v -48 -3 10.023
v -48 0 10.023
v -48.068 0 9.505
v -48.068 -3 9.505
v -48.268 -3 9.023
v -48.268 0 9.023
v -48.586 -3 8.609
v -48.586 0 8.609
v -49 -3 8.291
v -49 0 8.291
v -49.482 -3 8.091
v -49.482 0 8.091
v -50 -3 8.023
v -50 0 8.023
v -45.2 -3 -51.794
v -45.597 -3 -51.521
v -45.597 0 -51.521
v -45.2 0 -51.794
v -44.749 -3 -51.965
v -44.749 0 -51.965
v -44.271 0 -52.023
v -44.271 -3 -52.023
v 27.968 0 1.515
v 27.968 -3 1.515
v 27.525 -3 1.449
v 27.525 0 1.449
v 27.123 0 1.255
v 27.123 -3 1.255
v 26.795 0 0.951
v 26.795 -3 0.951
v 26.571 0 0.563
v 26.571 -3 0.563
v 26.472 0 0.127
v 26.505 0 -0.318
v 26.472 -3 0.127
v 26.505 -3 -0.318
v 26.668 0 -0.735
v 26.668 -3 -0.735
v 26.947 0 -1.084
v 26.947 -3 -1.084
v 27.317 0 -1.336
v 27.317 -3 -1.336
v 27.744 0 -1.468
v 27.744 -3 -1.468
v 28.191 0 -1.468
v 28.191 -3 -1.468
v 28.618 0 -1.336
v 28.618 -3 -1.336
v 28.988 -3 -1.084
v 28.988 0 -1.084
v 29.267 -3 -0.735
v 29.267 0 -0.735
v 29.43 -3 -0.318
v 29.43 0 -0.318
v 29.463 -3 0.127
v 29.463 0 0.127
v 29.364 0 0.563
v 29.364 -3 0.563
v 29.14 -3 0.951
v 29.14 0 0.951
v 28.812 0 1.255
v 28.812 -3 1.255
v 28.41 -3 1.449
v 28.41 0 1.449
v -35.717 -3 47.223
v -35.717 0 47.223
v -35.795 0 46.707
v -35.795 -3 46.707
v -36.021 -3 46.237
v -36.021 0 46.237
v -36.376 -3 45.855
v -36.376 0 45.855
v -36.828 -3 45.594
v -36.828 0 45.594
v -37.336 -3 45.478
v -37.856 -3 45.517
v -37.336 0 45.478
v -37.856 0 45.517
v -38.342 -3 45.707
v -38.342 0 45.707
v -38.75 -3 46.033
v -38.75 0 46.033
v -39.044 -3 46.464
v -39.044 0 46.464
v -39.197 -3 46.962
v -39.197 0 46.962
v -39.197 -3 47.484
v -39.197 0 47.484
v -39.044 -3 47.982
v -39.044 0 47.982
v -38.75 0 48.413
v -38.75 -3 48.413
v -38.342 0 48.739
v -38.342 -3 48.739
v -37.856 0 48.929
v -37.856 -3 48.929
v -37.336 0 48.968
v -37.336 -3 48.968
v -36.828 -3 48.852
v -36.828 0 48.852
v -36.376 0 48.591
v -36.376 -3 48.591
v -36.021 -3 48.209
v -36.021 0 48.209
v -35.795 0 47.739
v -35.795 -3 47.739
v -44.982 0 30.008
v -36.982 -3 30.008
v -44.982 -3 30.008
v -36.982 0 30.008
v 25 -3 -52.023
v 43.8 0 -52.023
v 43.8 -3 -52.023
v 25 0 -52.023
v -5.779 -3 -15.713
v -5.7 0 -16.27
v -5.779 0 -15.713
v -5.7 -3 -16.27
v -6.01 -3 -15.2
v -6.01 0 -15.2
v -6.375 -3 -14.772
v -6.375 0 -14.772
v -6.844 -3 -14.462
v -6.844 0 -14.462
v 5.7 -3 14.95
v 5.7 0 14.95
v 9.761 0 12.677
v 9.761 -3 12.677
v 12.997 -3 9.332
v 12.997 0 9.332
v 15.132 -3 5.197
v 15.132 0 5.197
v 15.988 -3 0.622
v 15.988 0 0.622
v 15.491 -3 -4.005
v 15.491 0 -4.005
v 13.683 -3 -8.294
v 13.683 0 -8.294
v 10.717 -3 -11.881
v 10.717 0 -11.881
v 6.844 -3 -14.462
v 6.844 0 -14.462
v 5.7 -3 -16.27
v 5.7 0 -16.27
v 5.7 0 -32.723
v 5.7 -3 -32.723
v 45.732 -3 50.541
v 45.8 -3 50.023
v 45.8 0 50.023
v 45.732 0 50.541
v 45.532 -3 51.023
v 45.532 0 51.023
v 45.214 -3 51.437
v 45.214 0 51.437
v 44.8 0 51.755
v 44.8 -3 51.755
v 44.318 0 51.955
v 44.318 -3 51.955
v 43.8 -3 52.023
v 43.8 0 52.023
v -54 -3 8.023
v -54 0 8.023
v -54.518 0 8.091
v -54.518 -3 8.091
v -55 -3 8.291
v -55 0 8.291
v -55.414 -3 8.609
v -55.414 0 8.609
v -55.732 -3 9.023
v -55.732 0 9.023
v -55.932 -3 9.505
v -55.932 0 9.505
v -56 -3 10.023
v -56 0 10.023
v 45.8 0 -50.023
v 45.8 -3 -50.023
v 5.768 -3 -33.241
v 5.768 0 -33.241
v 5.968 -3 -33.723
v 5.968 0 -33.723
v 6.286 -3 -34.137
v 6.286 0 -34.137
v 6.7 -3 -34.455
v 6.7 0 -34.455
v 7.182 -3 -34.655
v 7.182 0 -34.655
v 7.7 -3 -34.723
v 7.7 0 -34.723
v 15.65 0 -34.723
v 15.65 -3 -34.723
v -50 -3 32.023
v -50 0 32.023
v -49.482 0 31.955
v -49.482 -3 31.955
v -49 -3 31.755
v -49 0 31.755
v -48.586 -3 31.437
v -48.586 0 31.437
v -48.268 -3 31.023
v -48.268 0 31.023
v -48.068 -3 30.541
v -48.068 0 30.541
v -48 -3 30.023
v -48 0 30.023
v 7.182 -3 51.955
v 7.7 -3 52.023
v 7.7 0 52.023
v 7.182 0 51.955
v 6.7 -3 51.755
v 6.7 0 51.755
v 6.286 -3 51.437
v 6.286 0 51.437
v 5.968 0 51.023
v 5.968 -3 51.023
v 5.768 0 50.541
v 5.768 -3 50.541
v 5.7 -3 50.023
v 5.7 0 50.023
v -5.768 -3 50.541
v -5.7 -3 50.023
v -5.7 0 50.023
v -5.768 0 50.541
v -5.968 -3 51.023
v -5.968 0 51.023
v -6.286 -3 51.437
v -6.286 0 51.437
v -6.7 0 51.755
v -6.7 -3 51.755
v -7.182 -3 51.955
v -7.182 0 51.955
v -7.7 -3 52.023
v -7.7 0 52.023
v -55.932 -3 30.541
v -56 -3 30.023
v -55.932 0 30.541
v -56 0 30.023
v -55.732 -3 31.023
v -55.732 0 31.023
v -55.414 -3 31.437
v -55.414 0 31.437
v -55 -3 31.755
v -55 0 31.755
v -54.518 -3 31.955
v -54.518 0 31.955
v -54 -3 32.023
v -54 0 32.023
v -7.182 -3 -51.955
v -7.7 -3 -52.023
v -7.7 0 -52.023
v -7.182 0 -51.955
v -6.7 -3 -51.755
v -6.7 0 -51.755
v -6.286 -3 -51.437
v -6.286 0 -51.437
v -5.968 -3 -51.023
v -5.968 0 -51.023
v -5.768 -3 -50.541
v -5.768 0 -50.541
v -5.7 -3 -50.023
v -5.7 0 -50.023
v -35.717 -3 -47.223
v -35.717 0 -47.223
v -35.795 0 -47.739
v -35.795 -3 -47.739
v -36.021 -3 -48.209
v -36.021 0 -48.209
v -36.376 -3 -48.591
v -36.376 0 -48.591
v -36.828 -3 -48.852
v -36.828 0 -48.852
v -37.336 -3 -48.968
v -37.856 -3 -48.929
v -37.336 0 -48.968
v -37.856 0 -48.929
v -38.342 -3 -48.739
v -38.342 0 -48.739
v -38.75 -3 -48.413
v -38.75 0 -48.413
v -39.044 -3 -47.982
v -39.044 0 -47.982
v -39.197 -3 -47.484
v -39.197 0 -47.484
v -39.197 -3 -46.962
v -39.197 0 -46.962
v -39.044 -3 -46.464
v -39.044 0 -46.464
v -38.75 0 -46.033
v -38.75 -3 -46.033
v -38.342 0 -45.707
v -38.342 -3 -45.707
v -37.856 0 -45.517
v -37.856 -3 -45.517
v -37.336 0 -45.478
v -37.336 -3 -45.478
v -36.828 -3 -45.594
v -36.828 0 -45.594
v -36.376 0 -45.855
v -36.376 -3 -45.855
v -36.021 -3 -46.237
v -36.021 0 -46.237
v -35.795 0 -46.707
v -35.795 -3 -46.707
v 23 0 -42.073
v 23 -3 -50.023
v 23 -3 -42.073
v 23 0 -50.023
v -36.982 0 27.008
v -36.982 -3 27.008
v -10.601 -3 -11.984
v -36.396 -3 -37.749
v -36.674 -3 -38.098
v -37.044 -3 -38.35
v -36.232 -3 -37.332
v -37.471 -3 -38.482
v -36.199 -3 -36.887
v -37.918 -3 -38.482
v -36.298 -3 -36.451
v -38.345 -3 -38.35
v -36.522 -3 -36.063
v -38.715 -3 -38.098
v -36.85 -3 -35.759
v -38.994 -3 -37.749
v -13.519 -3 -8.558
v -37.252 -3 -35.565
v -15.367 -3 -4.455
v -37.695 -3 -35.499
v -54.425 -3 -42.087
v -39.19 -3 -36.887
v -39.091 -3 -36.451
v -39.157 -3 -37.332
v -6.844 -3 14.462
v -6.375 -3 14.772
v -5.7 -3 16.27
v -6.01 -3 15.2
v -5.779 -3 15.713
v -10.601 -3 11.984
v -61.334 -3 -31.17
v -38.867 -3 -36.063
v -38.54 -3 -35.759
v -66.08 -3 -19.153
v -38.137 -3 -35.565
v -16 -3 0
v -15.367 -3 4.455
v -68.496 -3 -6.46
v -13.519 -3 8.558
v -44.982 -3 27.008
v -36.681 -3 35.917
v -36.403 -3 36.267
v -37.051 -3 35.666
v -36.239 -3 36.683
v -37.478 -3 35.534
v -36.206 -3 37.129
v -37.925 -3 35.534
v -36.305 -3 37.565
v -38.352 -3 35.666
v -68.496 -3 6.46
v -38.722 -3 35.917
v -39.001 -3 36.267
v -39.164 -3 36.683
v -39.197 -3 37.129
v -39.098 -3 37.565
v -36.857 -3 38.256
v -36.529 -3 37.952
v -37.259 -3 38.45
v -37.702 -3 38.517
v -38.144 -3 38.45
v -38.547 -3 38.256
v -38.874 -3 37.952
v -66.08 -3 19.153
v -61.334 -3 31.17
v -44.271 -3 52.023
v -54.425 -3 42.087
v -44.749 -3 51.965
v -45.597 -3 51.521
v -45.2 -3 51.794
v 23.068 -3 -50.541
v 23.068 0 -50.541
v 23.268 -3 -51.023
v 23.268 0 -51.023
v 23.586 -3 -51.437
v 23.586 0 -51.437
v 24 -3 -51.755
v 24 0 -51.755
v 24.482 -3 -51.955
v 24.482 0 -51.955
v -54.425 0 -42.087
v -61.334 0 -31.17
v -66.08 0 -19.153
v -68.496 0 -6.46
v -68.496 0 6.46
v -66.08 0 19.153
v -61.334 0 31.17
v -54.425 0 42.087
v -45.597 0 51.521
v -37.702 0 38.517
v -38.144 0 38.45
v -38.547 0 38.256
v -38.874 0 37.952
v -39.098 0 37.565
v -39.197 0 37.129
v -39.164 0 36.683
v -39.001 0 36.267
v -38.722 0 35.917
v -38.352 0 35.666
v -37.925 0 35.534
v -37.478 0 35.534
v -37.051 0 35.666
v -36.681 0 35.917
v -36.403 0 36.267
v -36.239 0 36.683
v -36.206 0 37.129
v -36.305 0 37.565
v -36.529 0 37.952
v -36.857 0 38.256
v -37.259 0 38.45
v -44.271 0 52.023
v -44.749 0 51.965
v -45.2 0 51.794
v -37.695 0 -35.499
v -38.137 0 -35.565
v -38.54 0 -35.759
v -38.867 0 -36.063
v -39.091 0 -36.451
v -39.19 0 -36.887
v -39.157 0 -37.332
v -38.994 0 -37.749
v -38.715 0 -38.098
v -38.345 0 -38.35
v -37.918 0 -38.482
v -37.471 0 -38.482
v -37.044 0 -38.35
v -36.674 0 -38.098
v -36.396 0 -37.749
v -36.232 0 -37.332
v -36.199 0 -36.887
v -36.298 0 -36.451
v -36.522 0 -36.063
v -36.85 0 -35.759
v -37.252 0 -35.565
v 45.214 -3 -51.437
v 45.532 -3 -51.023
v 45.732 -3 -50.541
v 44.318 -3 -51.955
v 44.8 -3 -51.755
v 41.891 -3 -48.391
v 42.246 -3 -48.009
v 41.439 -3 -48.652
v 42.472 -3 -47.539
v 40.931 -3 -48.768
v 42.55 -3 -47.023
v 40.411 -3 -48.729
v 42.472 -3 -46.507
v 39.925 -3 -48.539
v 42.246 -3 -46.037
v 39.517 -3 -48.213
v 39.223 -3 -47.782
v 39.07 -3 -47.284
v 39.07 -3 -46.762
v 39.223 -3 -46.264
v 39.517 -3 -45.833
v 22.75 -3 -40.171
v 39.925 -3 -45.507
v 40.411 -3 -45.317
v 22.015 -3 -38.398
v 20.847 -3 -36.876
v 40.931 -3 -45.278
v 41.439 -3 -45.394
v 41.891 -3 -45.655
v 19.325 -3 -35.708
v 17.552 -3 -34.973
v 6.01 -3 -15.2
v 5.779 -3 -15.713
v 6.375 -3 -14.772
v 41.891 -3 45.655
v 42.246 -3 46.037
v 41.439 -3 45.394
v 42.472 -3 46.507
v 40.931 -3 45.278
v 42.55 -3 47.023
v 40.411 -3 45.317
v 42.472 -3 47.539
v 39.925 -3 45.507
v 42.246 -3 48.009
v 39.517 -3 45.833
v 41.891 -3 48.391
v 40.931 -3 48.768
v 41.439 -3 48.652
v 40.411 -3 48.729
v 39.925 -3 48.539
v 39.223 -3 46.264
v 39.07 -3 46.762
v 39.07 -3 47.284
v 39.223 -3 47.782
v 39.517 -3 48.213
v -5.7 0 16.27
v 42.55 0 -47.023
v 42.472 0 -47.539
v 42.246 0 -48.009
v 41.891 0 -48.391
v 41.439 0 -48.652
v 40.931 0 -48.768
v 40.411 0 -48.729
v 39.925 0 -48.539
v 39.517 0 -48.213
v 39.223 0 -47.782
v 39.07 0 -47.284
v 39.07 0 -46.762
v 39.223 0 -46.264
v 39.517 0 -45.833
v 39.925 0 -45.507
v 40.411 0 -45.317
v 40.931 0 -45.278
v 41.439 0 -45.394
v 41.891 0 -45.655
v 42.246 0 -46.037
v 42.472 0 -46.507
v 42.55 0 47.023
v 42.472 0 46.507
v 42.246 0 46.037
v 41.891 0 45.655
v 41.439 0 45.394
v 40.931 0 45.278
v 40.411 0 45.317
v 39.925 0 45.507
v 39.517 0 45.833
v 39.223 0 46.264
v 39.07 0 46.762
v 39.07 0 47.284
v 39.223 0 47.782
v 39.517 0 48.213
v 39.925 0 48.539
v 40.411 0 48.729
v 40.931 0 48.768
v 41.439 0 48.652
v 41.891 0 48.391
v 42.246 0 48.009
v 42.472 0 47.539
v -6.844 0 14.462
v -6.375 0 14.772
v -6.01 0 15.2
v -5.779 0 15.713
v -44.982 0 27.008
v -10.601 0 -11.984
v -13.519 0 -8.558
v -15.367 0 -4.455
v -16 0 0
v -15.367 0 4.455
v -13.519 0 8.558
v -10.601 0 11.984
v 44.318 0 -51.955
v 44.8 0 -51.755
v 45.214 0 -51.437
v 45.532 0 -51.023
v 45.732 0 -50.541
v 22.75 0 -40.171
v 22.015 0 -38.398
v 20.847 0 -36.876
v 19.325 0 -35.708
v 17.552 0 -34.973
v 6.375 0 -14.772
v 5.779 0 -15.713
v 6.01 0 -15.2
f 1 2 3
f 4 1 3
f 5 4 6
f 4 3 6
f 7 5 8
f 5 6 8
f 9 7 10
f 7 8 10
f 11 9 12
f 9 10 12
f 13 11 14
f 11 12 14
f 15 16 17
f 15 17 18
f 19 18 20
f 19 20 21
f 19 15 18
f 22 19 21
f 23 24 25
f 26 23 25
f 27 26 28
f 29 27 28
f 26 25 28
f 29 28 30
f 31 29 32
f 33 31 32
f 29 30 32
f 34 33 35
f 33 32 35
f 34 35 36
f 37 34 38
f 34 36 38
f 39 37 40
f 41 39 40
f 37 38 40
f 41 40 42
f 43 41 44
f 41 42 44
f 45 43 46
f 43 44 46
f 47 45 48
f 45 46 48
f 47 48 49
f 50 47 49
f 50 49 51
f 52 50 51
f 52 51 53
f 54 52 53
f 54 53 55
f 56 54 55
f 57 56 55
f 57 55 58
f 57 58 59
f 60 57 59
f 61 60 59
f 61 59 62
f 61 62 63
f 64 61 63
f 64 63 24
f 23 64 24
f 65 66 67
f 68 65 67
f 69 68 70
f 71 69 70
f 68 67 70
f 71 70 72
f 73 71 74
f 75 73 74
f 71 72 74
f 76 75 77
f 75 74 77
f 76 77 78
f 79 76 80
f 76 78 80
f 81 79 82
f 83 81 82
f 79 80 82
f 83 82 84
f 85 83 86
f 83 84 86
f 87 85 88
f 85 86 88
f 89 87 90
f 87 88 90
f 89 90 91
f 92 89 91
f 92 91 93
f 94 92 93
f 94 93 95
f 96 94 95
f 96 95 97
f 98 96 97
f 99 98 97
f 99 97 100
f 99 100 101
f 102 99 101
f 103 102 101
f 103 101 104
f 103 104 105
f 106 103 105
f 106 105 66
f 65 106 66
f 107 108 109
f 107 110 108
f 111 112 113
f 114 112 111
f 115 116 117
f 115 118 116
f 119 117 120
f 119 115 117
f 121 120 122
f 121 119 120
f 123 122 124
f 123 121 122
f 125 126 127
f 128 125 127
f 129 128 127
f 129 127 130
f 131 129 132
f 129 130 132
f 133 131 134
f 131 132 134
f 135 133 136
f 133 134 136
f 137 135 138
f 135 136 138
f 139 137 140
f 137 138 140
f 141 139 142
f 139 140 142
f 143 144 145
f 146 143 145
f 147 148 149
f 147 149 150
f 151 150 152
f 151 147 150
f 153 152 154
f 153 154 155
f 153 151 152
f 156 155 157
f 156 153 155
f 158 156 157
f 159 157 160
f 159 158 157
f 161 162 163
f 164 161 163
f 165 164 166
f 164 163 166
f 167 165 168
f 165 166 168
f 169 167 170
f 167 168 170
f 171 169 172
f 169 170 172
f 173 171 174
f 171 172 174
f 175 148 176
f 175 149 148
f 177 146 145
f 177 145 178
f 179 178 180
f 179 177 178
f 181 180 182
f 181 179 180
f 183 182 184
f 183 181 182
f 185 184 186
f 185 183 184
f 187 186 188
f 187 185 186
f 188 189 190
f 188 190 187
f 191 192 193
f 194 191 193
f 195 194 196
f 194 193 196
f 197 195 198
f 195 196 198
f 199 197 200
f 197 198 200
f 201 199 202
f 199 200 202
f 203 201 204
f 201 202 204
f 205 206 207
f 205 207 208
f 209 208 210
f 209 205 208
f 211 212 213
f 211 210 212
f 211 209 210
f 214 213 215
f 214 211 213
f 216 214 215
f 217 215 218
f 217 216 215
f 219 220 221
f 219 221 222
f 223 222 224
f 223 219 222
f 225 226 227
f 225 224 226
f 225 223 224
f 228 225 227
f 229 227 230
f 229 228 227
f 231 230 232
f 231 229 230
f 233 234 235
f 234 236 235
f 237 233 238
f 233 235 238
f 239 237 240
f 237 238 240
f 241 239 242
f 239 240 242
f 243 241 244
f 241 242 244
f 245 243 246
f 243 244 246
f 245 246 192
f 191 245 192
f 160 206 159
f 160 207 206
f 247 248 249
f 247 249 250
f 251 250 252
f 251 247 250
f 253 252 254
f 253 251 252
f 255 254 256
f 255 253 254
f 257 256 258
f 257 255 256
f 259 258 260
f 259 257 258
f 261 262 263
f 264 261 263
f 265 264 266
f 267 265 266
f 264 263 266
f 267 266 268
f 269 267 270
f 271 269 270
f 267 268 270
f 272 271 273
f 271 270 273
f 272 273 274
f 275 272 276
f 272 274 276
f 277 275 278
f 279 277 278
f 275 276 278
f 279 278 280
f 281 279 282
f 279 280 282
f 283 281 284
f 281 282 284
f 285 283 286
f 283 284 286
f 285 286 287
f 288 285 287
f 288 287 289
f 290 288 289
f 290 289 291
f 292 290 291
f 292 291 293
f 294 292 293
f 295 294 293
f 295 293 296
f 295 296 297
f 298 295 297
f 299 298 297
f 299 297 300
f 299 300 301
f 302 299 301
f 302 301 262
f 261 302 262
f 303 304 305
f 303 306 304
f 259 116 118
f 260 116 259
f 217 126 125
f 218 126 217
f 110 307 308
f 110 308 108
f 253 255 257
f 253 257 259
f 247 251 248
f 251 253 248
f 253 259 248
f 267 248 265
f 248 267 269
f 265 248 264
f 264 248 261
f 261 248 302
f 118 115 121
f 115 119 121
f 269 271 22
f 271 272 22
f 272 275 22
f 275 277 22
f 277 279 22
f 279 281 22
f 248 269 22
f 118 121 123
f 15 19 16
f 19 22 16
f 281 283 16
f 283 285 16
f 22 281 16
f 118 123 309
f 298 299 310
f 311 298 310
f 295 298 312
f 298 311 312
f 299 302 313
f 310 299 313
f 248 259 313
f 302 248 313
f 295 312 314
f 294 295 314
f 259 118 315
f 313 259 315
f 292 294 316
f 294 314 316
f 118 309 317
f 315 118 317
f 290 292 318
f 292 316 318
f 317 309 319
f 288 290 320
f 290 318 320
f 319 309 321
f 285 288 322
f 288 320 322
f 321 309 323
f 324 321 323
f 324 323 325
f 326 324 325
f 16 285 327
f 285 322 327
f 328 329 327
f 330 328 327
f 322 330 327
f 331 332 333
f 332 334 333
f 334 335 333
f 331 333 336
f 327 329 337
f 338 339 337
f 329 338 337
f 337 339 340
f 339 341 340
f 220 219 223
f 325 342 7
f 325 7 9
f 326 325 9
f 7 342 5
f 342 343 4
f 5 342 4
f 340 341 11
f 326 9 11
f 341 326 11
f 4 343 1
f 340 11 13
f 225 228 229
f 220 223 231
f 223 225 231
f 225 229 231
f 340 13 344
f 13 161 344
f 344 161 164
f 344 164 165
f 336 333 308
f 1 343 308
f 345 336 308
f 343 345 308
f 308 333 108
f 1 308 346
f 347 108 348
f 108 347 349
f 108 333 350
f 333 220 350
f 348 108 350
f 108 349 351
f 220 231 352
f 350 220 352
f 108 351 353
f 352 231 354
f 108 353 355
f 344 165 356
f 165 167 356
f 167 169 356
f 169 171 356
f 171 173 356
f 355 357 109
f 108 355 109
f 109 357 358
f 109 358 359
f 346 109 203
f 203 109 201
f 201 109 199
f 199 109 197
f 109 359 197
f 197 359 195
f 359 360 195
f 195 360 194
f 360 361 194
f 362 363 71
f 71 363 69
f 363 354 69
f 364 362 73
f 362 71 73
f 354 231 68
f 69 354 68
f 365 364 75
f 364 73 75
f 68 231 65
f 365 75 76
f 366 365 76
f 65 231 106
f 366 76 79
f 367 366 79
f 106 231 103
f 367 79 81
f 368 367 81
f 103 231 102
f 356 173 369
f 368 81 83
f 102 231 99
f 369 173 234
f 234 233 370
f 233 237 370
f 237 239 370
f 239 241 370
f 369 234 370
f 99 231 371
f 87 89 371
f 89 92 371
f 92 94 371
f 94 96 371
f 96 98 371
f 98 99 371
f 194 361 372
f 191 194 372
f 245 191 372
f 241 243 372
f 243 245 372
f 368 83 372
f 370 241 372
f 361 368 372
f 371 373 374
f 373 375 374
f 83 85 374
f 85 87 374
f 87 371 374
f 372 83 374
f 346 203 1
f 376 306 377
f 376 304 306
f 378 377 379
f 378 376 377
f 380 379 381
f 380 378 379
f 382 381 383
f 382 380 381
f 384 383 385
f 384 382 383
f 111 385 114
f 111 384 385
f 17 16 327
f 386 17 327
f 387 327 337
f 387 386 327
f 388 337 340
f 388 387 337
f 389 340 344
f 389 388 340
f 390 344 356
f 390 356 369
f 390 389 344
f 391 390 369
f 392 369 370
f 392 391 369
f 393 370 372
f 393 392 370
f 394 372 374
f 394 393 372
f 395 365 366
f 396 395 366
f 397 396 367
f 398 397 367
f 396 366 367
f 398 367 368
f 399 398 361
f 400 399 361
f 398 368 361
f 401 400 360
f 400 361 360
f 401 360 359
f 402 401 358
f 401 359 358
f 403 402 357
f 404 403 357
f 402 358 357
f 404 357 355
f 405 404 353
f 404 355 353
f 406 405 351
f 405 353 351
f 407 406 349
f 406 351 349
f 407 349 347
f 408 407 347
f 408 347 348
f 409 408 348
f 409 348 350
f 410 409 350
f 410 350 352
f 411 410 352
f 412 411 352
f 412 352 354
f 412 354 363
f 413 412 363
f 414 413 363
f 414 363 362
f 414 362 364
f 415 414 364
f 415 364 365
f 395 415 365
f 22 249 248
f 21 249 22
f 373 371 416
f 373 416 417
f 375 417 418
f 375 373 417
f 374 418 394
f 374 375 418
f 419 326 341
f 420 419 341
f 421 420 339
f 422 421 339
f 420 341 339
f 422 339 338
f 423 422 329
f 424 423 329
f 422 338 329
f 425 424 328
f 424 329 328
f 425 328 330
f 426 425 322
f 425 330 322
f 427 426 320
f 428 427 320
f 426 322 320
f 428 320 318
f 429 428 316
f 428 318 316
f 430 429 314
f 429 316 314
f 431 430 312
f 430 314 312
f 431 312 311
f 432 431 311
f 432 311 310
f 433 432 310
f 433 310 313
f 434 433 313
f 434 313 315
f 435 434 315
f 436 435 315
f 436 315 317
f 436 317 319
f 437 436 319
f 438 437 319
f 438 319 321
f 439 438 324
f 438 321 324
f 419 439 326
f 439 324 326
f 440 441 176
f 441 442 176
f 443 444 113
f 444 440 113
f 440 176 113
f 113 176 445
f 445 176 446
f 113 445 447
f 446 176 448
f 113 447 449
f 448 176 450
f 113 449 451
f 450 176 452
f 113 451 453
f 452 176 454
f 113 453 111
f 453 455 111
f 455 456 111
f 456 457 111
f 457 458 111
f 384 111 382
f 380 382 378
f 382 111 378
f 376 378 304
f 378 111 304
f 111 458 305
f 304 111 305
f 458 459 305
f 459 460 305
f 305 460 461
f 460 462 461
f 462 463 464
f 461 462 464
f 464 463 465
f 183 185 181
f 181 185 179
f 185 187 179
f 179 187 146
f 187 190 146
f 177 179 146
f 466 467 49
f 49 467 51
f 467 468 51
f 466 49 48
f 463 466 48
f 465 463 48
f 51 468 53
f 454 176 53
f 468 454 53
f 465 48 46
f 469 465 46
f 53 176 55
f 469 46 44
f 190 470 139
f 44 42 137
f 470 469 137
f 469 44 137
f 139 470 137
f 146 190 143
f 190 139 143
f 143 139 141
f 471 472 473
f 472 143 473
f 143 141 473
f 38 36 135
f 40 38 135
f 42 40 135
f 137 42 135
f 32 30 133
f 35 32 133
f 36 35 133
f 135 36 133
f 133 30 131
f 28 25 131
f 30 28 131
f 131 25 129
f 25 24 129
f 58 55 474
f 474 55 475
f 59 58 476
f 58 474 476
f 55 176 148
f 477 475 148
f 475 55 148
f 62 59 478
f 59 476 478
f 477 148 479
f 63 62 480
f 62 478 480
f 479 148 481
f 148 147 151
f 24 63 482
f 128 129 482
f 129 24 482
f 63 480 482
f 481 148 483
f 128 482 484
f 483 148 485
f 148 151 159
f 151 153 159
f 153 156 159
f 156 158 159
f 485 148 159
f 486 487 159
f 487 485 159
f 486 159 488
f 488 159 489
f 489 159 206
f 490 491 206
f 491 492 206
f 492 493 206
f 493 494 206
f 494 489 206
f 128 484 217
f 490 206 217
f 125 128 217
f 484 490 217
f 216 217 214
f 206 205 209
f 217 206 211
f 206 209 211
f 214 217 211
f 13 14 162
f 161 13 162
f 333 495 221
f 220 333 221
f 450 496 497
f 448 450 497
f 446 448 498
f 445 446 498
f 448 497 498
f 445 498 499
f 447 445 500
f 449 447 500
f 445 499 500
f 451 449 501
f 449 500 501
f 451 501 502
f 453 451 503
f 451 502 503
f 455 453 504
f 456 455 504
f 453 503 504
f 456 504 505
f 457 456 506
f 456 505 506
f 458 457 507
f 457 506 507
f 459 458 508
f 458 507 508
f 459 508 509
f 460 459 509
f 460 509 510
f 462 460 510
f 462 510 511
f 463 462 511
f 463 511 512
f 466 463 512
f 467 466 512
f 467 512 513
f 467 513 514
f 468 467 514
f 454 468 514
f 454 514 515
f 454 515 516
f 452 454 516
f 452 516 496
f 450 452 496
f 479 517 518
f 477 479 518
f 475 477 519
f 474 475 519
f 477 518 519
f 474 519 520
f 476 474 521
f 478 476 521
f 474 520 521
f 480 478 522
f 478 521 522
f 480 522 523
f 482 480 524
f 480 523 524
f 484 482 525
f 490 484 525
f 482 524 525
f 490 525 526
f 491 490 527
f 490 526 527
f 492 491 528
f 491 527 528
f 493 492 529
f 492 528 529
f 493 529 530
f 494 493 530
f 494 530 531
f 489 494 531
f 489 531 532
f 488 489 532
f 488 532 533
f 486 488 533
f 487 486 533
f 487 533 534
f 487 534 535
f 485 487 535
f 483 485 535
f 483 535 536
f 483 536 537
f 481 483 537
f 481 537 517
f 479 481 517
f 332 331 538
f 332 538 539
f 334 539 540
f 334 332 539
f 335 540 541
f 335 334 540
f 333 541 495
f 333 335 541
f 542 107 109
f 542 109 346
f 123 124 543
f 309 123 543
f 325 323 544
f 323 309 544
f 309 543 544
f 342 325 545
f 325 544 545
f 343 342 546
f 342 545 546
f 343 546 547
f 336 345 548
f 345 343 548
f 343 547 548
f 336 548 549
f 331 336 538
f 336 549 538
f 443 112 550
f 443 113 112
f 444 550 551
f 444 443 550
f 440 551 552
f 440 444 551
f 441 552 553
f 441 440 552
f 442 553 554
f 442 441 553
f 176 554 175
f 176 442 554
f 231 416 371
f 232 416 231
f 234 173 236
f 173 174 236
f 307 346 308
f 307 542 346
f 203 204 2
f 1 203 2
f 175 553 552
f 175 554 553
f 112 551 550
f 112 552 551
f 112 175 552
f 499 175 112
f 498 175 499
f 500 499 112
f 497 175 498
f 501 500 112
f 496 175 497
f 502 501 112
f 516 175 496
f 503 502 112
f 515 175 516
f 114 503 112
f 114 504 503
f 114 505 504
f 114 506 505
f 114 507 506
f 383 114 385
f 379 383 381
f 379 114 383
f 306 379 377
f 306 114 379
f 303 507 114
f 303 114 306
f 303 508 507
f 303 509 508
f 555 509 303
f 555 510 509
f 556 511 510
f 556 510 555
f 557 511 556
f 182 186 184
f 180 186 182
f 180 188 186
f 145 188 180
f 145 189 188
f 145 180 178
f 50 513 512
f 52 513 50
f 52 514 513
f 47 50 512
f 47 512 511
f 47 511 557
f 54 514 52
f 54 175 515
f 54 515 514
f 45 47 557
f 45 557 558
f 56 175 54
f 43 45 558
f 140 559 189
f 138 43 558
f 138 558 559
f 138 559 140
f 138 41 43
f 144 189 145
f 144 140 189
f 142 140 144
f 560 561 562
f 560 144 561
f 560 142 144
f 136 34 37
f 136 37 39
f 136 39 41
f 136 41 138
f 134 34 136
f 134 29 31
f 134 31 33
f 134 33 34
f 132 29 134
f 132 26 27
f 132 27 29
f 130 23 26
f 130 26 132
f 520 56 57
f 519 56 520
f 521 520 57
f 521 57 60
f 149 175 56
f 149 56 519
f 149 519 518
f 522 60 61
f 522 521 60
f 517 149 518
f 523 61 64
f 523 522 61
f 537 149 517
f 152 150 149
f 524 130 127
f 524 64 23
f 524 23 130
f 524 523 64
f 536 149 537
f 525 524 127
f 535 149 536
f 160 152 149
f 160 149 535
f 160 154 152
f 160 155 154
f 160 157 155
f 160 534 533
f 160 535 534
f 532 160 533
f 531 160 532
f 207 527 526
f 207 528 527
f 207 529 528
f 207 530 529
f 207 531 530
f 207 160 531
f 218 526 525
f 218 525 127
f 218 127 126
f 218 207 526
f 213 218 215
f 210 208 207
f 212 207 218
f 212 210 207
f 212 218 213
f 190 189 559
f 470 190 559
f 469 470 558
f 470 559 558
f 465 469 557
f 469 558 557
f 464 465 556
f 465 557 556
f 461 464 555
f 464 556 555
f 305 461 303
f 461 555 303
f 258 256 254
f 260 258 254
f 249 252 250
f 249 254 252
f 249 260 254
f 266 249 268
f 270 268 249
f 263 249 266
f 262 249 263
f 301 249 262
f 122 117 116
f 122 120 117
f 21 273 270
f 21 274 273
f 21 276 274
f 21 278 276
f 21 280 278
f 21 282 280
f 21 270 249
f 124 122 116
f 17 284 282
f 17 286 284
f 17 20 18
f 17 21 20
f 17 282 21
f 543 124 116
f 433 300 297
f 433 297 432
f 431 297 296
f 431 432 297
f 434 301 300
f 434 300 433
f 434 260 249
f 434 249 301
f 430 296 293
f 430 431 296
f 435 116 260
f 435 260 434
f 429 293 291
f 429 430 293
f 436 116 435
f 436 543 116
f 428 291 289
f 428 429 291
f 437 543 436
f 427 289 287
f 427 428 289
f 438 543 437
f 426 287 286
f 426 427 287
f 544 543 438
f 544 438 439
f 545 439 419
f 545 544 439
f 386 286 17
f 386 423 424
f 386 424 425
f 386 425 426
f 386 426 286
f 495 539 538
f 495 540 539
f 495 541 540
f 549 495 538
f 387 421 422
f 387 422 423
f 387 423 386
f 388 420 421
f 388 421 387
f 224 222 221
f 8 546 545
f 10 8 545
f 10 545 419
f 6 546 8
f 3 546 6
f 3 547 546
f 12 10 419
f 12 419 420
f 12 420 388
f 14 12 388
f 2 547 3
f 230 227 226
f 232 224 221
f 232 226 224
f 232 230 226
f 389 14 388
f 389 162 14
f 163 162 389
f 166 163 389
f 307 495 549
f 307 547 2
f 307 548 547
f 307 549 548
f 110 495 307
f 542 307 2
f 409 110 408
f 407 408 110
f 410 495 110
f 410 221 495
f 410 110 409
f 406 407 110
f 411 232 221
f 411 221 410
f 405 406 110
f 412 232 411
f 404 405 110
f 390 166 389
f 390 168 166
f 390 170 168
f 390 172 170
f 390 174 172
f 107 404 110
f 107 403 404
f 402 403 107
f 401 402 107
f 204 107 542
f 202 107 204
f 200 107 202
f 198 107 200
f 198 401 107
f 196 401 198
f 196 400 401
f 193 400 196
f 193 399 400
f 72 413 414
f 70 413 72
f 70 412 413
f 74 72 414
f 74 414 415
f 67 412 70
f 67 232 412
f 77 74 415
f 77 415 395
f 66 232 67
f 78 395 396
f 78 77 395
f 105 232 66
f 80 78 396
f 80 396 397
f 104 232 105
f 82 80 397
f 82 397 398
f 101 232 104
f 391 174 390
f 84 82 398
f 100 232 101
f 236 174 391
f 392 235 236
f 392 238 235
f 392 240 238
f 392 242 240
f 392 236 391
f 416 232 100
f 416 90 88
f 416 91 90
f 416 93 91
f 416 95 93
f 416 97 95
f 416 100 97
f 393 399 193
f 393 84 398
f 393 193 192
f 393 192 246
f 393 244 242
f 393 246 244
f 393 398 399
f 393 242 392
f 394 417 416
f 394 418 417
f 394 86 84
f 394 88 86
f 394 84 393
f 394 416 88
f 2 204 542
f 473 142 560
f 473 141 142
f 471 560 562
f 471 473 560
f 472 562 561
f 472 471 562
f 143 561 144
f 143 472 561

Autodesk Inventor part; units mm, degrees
ref_plane "YZ Plane" through (0, 0, 0) normal (1, 0, 0) x (0, 1, 0)
ref_plane "XZ Plane" through (0, 0, 0) normal (0, 1, 0) x (-1, 0, 0)
ref_plane "XY Plane" through (0, 0, 0) normal (0, 0, 1) x (1, 0, 0)
sketch "Sketch1" plane through (0, 0, 0) normal (0, 1, 0) x (-1, 0, 0)
  line L0 (46.9204, 62.223) -> (-47, 62.223)
  line L1 (-47, -62.223) -> (46.9204, -62.223)
  line L2 (-56, 53.223) -> (-56, -53.223)
  arc A0 (50.0907, -61.0894) -> (50.0907, 61.0894) centre (0, 0) ccw
  arc A1 (50.0907, 61.0894) -> (46.9204, 62.223) centre (46.9204, 57.223) ccw
  arc A2 (46.9204, -62.223) -> (50.0907, -61.0894) centre (46.9204, -57.223) ccw
  arc A3 (-47, 62.223) -> (-56, 53.223) centre (-47, 53.223) ccw
  arc A4 (-56, -53.223) -> (-47, -62.223) centre (-47, -53.223) ccw
  line L3 (-46, 52.223) -> (45.0972, 52.223)
  arc A5 (45.0972, -52.223) -> (45.0972, 52.223) centre (0, 0) ccw
  line L4 (45.0972, -52.223) -> (-46, -52.223)
  line L5 (-46, -52.223) -> (-46, 52.223)
  circle A6 centre (0, 0) radius 8.5
  circle A7 centre (0, 0) radius 15.5
  line L6 (-5.5, -14.4914) -> (-5.5, -52.223)
  line L7 (0, 0) -> (0, -8.5)
  line L8 (5.5, -14.4914) -> (5.5, -52.223)
  line L9 (0, 0) -> (8.5, 0)
  line L10 (-5.5, 14.4914) -> (-5.5, 52.223)
  line L11 (5.5, 14.4914) -> (5.5, 52.223)
  circle A8 centre (-14.15, -43.573) radius 5.65
  line L12 (-14.15, -43.573) -> (-14.15, -52.223)
  line L13 (-5.5, -43.573) -> (-14.15, -43.573)
  line L14 (-5.5, -34.923) -> (-15.65, -34.923)
  line L15 (-22.8, -42.073) -> (-22.8, -52.223)
  arc A9 (-15.65, -34.923) -> (-22.8, -42.073) centre (-15.65, -42.073) ccw
  line L16 (45.0227, 52.023) -> (-45.8, 52.023)
  line L17 (-45.8, 52.023) -> (-45.8, -52.023)
  line L18 (-45.8, -52.023) -> (45.0227, -52.023)
  arc A10 (45.0227, -52.023) -> (45.0227, 52.023) centre (0, 0) ccw
  line L19 (5.7, -14.4914) -> (5.7, -52.223)
  circle A11 centre (0, 0) radius 16
  line L20 (5.7, 14.9503) -> (5.7, 52.223)
  line L21 (-5.7, 14.9503) -> (-5.7, 52.223)
  line L22 (-5.7, -14.4914) -> (-5.7, -52.223)
  line L23 (-23, -52.223) -> (-23, -42.073)
  arc A12 (-15.65, -34.723) -> (-23, -42.073) centre (-15.65, -42.073) ccw
  line L24 (-15.65, -34.723) -> (-5.5, -34.723)
  point P0 (48.6754, 62.223)
  point P1 (48.6754, -62.223)
  point P2 (5.5, -52.223)
  point P3 (5.5, -14.4914)
  point P4 (5.5, 14.4914)
  point P5 (5.5, 52.223)
  point P6 (-5.5, 52.223)
  point P7 (-5.5, 14.4914)
  point P8 (-22.8, -52.223)
  point P9 (-46, -32.923)
  point P10 (-23, -52.023)
  point P11 (-5.7, -34.723)
  point P12 (-5.7, -14.9503)
  point P13 (-5.7, 52.023)
  point P14 (5.7, 52.023)
  point P15 (5.7, -14.9503)
  point P16 (5.7, -52.023)
  dimension "d2" = 62.223
  dimension "d4" = 56
  dimension "d5" = 62.223
  dimension "d6" = 79
  dimension "d7" = 5
  dimension "d8" = 9
  dimension "d18" = 10
  dimension "d21" = 17
  dimension "d22" = 7
  dimension "d24" = 5.5
  dimension "d41" = 11.3
  dimension "d45" = 8.65
  dimension "d46" = 8.65
  dimension "d47" = 17.3
  dimension "d48" = 3
  dimension "d49" = 90
  dimension "d50" = 7.15
  dimension "d102" = 0.2
  dimension "d103" = 0.2
  dimension "d104" = 0.5
  dimension "d105" = 0.2
  dimension "d106" = 0.2
  dimension "d107" = 0.2
  dimension "d108" = 0.2
extrude "Extrusion1" add sketch "Sketch1" against normal blind 3 contours L21 A11 L22 L24 A12 L23 L18 L17 L16 | L16 A10 L18 L19 A11 L20
fillet "Fillet11" radius 2 12 edges at (-5.7, -1.5, -14.9503) (-5.7, -1.5, 14.9503) (-5.7, -1.5, -52.023) (-45.0227, -1.5, -52.023) (5.7, -1.5, -14.9503) (5.7, -1.5, -34.723) (23, -1.5, -52.023) (45.8, -1.5, -52.023) (45.8, -1.5, 52.023) (5.7, -1.5, 52.023) (-5.7, -1.5, 52.023) (-45.0227, -1.5, 52.023)
sketch "Sketch6" plane through (0, 0, 0) normal (0, 1, 0) x (1, 0, 0)
  circle A0 centre (-37.467, 47.223) radius 1.75
  circle A1 centre (40.8, 47.023) radius 1.75
  line L0 (-7.7, 52.023) -> (-44.2712, 52.023) projected
  line L1 (-5.7, 16.2699) -> (-5.7, 50.023) projected
  line L2 (0, 0) -> (-24.1524, 0)
  circle A2 centre (-37.467, -47.223) radius 1.75
  line L3 (43.8, 52.023) -> (25, 52.023) projected
  line L4 (45.8, -50.023) -> (45.8, 50.023) projected
  circle A3 centre (40.8, -47.023) radius 1.75
  line L5 (-50, -8.023) -> (-54, -8.023)
  line L6 (-56, -10.023) -> (-56, -30.023)
  line L7 (-54, -32.023) -> (-50, -32.023)
  line L8 (-48, -30.023) -> (-48, -10.023)
  arc A4 (-48, -10.023) -> (-50, -8.023) centre (-50, -10.023) ccw
  arc A5 (-50, -32.023) -> (-48, -30.023) centre (-50, -30.023) ccw
  arc A6 (-56, -30.023) -> (-54, -32.023) centre (-54, -30.023) ccw
  arc A7 (-54, -8.023) -> (-56, -10.023) centre (-54, -10.023) ccw
  arc A8 (-45.5967, 51.5207) -> (-45.5967, -51.5207) centre (0, 0) ccw projected
  line L9 (-44.2712, -52.023) -> (-7.7, -52.023) projected
  dimension "d111" = 3.5
  dimension "d113" = 3.5
  dimension "d117" = 4.8
  dimension "d118" = 31.767
  dimension "d119" = 5
  dimension "d120" = 5
  dimension "d121" = 2
  dimension "d122" = 8
  dimension "d123" = 24
  dimension "d124" = 56
  dimension "d125" = 20
extrude "Extrusion7" cut sketch "Sketch6" against normal blind 3
sketch "Boceto9" plane through (0, 0, 0) normal (0, 1, 0) x (1, 0, 0)
  circle A0 centre (-37.6946, 36.9987) radius 1.6 construction
  circle A1 centre (-37.7016, -37.017) radius 1.6 construction
  circle A2 centre (27.9675, -0.0154) radius 1.5 construction
  point P0 (0, 0)
hole "Agujero1" at (-37.6946, 0, -36.9987) at (-37.7016, 0, 37.017) at (27.9675, 0, 0.0154) direction (0, -1, 0) diameter 3 end through all
sketch "Boceto10" plane through (0, 0, 0) normal (0, 1, 0) x (1, 0, 0)
  circle A0 centre (27.9675, -0.0154) radius 1.5 construction
  point P0 (0, 0)
hole "Agujero2" at (27.9675, 0, 0.0154) direction (0, -1, 0) diameter 3 end through all
sketch "Boceto11" plane through (0, 0, 0) normal (0, 1, 0) x (1, 0, 0)
  line L0 (-36.9824, -30.0076) -> (-44.9824, -30.0076) construction
  line L1 (-44.9824, -30.0076) -> (-44.9824, -27.0076) construction
  line L2 (-44.9824, -27.0076) -> (-36.9824, -27.0076) construction
  line L3 (-36.9824, -27.0076) -> (-36.9824, -30.0076) construction
  line L4 (-36.9824, -30.0076) -> (-44.9824, -30.0076)
  line L5 (-44.9824, -30.0076) -> (-44.9824, -27.0076)
  line L6 (-44.9824, -27.0076) -> (-36.9824, -27.0076)
  line L7 (-36.9824, -27.0076) -> (-36.9824, -30.0076)
  point P0 (0, 0)
extrude "Extrusión9" cut sketch "Boceto11" against normal through all
sketch "Sketch8" plane through (0, 0, 0) normal (0, 1, 0) x (1, 0, 0)
  line L0 (-56, -10.023) -> (-56, -30.023) projected
  arc A0 (-56, -30.023) -> (-54, -32.023) centre (-54, -30.023) ccw projected
  line L1 (-54, -32.023) -> (-50, -32.023) projected
  arc A1 (-50, -32.023) -> (-48, -30.023) centre (-50, -30.023) ccw projected
  line L2 (-48, -30.023) -> (-48, -10.023) projected
  arc A2 (-48, -10.023) -> (-50, -8.023) centre (-50, -10.023) ccw projected
  line L3 (-50, -8.023) -> (-54, -8.023) projected
  arc A3 (-54, -8.023) -> (-56, -10.023) centre (-54, -10.023) ccw projected
  circle A4 centre (-37.467, 47.223) radius 1.75 projected
  circle A5 centre (-37.467, -47.223) radius 1.75 projected
  arc A6 (-45.5967, -51.5207) -> (-44.2712, -52.023) centre (-44.2712, -50.023) ccw projected
  arc A7 (-45.5967, 51.5207) -> (-45.5967, -51.5207) centre (0, 0) ccw projected
  arc A8 (-44.2712, 52.023) -> (-45.5967, 51.5207) centre (-44.2712, 50.023) ccw projected
  line L4 (-44.2712, 52.023) -> (-7.7, 52.023) projected
  arc A9 (-5.7, 50.023) -> (-7.7, 52.023) centre (-7.7, 50.023) ccw projected
  line L5 (-5.7, 50.023) -> (-5.7, 16.2699) projected
  arc A10 (-6.8444, 14.4621) -> (-5.7, 16.2699) centre (-7.7, 16.2699) ccw projected
  arc A11 (-6.8444, 14.4621) -> (-6.8444, -14.4621) centre (0, 0) ccw projected
  arc A12 (-5.7, -16.2699) -> (-6.8444, -14.4621) centre (-7.7, -16.2699) ccw projected
  line L6 (-5.7, -16.2699) -> (-5.7, -50.023) projected
  arc A13 (-7.7, -52.023) -> (-5.7, -50.023) centre (-7.7, -50.023) ccw projected
  line L7 (-7.7, -52.023) -> (-44.2712, -52.023) projected
  circle A14 centre (40.8, 47.023) radius 1.75 projected
  circle A15 centre (40.8, -47.023) radius 1.75 projected
  arc A16 (5.7, -50.023) -> (7.7, -52.023) centre (7.7, -50.023) ccw projected
  line L8 (5.7, -50.023) -> (5.7, -14.9503) projected
  arc A17 (5.7, -14.9503) -> (6.8444, 14.4621) centre (0, 0) ccw projected
  arc A18 (5.7, 16.2699) -> (6.8444, 14.4621) centre (7.7, 16.2699) ccw projected
  line L9 (5.7, 16.2699) -> (5.7, 32.723) projected
  arc A19 (7.7, 34.723) -> (5.7, 32.723) centre (7.7, 32.723) ccw projected
  line L10 (7.7, 34.723) -> (15.65, 34.723) projected
  arc A20 (15.65, 34.723) -> (23, 42.073) centre (15.65, 42.073) ccw projected
  line L11 (23, 42.073) -> (23, 50.023) projected
  arc A21 (25, 52.023) -> (23, 50.023) centre (25, 50.023) ccw projected
  line L12 (25, 52.023) -> (43.8, 52.023) projected
  arc A22 (45.8, 50.023) -> (43.8, 52.023) centre (43.8, 50.023) ccw projected
  line L13 (45.8, 50.023) -> (45.8, -50.023) projected
  arc A23 (43.8, -52.023) -> (45.8, -50.023) centre (43.8, -50.023) ccw projected
  line L14 (43.8, -52.023) -> (7.7, -52.023) projected
  line L15 (10.7, 29.723) -> (10.7, 18.0696)
  arc A24 (10.7, -18.0696) -> (10.7, 18.0696) centre (0, 0) ccw
  line L16 (10.7, -18.0696) -> (10.7, -47.023)
  line L17 (10.7, -47.023) -> (40.8, -47.023)
  line L18 (40.8, -47.023) -> (40.8, 47.023)
  line L19 (40.8, 47.023) -> (28, 47.023)
  line L20 (28, 47.023) -> (28, 42.073)
  arc A25 (15.65, 29.723) -> (28, 42.073) centre (15.65, 42.073) ccw
  line L21 (15.65, 29.723) -> (10.7, 29.723)
  line L22 (10.7, 29.723) -> (30.7, 29.723)
  line L23 (30.7, 29.723) -> (30.7, 9.723)
  line L24 (30.7, 9.723) -> (18.6135, 9.723)
  point P0 (15.65, 29.723)
  dimension "d126" = 5
  dimension "d127" = 20
  dimension "d128" = 20
properties part number "Acrilicos Superiores"
